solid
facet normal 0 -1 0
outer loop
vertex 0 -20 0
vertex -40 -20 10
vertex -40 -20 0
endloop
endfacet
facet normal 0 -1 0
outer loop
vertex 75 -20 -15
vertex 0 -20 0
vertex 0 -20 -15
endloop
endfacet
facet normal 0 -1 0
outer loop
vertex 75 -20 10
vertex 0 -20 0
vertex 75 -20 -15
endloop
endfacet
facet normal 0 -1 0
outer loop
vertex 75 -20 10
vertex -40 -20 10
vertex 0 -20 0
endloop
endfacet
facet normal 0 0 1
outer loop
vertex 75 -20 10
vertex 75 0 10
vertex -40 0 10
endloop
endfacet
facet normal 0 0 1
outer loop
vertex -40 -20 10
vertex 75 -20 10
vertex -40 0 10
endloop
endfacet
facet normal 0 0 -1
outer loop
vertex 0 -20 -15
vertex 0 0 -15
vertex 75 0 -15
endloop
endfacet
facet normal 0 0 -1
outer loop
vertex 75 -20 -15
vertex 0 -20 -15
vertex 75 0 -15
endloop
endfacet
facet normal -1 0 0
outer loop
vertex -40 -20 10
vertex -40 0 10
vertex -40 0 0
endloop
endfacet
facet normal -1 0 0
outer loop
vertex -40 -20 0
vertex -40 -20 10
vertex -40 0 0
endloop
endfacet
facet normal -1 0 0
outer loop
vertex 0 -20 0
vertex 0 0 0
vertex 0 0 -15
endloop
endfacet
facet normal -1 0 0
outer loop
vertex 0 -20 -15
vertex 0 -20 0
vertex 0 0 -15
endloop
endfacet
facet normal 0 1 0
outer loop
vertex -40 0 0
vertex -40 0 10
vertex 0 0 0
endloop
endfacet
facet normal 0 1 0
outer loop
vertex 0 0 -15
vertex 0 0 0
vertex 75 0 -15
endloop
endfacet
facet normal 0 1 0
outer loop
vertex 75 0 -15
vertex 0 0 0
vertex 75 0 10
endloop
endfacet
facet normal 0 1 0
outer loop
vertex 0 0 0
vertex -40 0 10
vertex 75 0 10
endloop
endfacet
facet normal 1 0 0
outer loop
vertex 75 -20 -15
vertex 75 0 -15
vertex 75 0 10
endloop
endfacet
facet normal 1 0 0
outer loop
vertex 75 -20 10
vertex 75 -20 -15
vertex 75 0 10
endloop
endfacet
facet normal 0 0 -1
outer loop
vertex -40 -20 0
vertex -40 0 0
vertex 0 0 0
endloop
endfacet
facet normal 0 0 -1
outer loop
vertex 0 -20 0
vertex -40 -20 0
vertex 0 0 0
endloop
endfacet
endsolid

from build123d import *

# Parameters (mm, degrees)
PAD_DEPTH = 20


with BuildPart() as part:
    # Sketch → Pad (new body)
    with BuildSketch(Plane.XZ):
        Polygon((-40, 10), (-40, 0), (0, 0), (0, -15), (75, -15), (75, 10), align=None)
    extrude(amount=PAD_DEPTH)


solid = part.part
